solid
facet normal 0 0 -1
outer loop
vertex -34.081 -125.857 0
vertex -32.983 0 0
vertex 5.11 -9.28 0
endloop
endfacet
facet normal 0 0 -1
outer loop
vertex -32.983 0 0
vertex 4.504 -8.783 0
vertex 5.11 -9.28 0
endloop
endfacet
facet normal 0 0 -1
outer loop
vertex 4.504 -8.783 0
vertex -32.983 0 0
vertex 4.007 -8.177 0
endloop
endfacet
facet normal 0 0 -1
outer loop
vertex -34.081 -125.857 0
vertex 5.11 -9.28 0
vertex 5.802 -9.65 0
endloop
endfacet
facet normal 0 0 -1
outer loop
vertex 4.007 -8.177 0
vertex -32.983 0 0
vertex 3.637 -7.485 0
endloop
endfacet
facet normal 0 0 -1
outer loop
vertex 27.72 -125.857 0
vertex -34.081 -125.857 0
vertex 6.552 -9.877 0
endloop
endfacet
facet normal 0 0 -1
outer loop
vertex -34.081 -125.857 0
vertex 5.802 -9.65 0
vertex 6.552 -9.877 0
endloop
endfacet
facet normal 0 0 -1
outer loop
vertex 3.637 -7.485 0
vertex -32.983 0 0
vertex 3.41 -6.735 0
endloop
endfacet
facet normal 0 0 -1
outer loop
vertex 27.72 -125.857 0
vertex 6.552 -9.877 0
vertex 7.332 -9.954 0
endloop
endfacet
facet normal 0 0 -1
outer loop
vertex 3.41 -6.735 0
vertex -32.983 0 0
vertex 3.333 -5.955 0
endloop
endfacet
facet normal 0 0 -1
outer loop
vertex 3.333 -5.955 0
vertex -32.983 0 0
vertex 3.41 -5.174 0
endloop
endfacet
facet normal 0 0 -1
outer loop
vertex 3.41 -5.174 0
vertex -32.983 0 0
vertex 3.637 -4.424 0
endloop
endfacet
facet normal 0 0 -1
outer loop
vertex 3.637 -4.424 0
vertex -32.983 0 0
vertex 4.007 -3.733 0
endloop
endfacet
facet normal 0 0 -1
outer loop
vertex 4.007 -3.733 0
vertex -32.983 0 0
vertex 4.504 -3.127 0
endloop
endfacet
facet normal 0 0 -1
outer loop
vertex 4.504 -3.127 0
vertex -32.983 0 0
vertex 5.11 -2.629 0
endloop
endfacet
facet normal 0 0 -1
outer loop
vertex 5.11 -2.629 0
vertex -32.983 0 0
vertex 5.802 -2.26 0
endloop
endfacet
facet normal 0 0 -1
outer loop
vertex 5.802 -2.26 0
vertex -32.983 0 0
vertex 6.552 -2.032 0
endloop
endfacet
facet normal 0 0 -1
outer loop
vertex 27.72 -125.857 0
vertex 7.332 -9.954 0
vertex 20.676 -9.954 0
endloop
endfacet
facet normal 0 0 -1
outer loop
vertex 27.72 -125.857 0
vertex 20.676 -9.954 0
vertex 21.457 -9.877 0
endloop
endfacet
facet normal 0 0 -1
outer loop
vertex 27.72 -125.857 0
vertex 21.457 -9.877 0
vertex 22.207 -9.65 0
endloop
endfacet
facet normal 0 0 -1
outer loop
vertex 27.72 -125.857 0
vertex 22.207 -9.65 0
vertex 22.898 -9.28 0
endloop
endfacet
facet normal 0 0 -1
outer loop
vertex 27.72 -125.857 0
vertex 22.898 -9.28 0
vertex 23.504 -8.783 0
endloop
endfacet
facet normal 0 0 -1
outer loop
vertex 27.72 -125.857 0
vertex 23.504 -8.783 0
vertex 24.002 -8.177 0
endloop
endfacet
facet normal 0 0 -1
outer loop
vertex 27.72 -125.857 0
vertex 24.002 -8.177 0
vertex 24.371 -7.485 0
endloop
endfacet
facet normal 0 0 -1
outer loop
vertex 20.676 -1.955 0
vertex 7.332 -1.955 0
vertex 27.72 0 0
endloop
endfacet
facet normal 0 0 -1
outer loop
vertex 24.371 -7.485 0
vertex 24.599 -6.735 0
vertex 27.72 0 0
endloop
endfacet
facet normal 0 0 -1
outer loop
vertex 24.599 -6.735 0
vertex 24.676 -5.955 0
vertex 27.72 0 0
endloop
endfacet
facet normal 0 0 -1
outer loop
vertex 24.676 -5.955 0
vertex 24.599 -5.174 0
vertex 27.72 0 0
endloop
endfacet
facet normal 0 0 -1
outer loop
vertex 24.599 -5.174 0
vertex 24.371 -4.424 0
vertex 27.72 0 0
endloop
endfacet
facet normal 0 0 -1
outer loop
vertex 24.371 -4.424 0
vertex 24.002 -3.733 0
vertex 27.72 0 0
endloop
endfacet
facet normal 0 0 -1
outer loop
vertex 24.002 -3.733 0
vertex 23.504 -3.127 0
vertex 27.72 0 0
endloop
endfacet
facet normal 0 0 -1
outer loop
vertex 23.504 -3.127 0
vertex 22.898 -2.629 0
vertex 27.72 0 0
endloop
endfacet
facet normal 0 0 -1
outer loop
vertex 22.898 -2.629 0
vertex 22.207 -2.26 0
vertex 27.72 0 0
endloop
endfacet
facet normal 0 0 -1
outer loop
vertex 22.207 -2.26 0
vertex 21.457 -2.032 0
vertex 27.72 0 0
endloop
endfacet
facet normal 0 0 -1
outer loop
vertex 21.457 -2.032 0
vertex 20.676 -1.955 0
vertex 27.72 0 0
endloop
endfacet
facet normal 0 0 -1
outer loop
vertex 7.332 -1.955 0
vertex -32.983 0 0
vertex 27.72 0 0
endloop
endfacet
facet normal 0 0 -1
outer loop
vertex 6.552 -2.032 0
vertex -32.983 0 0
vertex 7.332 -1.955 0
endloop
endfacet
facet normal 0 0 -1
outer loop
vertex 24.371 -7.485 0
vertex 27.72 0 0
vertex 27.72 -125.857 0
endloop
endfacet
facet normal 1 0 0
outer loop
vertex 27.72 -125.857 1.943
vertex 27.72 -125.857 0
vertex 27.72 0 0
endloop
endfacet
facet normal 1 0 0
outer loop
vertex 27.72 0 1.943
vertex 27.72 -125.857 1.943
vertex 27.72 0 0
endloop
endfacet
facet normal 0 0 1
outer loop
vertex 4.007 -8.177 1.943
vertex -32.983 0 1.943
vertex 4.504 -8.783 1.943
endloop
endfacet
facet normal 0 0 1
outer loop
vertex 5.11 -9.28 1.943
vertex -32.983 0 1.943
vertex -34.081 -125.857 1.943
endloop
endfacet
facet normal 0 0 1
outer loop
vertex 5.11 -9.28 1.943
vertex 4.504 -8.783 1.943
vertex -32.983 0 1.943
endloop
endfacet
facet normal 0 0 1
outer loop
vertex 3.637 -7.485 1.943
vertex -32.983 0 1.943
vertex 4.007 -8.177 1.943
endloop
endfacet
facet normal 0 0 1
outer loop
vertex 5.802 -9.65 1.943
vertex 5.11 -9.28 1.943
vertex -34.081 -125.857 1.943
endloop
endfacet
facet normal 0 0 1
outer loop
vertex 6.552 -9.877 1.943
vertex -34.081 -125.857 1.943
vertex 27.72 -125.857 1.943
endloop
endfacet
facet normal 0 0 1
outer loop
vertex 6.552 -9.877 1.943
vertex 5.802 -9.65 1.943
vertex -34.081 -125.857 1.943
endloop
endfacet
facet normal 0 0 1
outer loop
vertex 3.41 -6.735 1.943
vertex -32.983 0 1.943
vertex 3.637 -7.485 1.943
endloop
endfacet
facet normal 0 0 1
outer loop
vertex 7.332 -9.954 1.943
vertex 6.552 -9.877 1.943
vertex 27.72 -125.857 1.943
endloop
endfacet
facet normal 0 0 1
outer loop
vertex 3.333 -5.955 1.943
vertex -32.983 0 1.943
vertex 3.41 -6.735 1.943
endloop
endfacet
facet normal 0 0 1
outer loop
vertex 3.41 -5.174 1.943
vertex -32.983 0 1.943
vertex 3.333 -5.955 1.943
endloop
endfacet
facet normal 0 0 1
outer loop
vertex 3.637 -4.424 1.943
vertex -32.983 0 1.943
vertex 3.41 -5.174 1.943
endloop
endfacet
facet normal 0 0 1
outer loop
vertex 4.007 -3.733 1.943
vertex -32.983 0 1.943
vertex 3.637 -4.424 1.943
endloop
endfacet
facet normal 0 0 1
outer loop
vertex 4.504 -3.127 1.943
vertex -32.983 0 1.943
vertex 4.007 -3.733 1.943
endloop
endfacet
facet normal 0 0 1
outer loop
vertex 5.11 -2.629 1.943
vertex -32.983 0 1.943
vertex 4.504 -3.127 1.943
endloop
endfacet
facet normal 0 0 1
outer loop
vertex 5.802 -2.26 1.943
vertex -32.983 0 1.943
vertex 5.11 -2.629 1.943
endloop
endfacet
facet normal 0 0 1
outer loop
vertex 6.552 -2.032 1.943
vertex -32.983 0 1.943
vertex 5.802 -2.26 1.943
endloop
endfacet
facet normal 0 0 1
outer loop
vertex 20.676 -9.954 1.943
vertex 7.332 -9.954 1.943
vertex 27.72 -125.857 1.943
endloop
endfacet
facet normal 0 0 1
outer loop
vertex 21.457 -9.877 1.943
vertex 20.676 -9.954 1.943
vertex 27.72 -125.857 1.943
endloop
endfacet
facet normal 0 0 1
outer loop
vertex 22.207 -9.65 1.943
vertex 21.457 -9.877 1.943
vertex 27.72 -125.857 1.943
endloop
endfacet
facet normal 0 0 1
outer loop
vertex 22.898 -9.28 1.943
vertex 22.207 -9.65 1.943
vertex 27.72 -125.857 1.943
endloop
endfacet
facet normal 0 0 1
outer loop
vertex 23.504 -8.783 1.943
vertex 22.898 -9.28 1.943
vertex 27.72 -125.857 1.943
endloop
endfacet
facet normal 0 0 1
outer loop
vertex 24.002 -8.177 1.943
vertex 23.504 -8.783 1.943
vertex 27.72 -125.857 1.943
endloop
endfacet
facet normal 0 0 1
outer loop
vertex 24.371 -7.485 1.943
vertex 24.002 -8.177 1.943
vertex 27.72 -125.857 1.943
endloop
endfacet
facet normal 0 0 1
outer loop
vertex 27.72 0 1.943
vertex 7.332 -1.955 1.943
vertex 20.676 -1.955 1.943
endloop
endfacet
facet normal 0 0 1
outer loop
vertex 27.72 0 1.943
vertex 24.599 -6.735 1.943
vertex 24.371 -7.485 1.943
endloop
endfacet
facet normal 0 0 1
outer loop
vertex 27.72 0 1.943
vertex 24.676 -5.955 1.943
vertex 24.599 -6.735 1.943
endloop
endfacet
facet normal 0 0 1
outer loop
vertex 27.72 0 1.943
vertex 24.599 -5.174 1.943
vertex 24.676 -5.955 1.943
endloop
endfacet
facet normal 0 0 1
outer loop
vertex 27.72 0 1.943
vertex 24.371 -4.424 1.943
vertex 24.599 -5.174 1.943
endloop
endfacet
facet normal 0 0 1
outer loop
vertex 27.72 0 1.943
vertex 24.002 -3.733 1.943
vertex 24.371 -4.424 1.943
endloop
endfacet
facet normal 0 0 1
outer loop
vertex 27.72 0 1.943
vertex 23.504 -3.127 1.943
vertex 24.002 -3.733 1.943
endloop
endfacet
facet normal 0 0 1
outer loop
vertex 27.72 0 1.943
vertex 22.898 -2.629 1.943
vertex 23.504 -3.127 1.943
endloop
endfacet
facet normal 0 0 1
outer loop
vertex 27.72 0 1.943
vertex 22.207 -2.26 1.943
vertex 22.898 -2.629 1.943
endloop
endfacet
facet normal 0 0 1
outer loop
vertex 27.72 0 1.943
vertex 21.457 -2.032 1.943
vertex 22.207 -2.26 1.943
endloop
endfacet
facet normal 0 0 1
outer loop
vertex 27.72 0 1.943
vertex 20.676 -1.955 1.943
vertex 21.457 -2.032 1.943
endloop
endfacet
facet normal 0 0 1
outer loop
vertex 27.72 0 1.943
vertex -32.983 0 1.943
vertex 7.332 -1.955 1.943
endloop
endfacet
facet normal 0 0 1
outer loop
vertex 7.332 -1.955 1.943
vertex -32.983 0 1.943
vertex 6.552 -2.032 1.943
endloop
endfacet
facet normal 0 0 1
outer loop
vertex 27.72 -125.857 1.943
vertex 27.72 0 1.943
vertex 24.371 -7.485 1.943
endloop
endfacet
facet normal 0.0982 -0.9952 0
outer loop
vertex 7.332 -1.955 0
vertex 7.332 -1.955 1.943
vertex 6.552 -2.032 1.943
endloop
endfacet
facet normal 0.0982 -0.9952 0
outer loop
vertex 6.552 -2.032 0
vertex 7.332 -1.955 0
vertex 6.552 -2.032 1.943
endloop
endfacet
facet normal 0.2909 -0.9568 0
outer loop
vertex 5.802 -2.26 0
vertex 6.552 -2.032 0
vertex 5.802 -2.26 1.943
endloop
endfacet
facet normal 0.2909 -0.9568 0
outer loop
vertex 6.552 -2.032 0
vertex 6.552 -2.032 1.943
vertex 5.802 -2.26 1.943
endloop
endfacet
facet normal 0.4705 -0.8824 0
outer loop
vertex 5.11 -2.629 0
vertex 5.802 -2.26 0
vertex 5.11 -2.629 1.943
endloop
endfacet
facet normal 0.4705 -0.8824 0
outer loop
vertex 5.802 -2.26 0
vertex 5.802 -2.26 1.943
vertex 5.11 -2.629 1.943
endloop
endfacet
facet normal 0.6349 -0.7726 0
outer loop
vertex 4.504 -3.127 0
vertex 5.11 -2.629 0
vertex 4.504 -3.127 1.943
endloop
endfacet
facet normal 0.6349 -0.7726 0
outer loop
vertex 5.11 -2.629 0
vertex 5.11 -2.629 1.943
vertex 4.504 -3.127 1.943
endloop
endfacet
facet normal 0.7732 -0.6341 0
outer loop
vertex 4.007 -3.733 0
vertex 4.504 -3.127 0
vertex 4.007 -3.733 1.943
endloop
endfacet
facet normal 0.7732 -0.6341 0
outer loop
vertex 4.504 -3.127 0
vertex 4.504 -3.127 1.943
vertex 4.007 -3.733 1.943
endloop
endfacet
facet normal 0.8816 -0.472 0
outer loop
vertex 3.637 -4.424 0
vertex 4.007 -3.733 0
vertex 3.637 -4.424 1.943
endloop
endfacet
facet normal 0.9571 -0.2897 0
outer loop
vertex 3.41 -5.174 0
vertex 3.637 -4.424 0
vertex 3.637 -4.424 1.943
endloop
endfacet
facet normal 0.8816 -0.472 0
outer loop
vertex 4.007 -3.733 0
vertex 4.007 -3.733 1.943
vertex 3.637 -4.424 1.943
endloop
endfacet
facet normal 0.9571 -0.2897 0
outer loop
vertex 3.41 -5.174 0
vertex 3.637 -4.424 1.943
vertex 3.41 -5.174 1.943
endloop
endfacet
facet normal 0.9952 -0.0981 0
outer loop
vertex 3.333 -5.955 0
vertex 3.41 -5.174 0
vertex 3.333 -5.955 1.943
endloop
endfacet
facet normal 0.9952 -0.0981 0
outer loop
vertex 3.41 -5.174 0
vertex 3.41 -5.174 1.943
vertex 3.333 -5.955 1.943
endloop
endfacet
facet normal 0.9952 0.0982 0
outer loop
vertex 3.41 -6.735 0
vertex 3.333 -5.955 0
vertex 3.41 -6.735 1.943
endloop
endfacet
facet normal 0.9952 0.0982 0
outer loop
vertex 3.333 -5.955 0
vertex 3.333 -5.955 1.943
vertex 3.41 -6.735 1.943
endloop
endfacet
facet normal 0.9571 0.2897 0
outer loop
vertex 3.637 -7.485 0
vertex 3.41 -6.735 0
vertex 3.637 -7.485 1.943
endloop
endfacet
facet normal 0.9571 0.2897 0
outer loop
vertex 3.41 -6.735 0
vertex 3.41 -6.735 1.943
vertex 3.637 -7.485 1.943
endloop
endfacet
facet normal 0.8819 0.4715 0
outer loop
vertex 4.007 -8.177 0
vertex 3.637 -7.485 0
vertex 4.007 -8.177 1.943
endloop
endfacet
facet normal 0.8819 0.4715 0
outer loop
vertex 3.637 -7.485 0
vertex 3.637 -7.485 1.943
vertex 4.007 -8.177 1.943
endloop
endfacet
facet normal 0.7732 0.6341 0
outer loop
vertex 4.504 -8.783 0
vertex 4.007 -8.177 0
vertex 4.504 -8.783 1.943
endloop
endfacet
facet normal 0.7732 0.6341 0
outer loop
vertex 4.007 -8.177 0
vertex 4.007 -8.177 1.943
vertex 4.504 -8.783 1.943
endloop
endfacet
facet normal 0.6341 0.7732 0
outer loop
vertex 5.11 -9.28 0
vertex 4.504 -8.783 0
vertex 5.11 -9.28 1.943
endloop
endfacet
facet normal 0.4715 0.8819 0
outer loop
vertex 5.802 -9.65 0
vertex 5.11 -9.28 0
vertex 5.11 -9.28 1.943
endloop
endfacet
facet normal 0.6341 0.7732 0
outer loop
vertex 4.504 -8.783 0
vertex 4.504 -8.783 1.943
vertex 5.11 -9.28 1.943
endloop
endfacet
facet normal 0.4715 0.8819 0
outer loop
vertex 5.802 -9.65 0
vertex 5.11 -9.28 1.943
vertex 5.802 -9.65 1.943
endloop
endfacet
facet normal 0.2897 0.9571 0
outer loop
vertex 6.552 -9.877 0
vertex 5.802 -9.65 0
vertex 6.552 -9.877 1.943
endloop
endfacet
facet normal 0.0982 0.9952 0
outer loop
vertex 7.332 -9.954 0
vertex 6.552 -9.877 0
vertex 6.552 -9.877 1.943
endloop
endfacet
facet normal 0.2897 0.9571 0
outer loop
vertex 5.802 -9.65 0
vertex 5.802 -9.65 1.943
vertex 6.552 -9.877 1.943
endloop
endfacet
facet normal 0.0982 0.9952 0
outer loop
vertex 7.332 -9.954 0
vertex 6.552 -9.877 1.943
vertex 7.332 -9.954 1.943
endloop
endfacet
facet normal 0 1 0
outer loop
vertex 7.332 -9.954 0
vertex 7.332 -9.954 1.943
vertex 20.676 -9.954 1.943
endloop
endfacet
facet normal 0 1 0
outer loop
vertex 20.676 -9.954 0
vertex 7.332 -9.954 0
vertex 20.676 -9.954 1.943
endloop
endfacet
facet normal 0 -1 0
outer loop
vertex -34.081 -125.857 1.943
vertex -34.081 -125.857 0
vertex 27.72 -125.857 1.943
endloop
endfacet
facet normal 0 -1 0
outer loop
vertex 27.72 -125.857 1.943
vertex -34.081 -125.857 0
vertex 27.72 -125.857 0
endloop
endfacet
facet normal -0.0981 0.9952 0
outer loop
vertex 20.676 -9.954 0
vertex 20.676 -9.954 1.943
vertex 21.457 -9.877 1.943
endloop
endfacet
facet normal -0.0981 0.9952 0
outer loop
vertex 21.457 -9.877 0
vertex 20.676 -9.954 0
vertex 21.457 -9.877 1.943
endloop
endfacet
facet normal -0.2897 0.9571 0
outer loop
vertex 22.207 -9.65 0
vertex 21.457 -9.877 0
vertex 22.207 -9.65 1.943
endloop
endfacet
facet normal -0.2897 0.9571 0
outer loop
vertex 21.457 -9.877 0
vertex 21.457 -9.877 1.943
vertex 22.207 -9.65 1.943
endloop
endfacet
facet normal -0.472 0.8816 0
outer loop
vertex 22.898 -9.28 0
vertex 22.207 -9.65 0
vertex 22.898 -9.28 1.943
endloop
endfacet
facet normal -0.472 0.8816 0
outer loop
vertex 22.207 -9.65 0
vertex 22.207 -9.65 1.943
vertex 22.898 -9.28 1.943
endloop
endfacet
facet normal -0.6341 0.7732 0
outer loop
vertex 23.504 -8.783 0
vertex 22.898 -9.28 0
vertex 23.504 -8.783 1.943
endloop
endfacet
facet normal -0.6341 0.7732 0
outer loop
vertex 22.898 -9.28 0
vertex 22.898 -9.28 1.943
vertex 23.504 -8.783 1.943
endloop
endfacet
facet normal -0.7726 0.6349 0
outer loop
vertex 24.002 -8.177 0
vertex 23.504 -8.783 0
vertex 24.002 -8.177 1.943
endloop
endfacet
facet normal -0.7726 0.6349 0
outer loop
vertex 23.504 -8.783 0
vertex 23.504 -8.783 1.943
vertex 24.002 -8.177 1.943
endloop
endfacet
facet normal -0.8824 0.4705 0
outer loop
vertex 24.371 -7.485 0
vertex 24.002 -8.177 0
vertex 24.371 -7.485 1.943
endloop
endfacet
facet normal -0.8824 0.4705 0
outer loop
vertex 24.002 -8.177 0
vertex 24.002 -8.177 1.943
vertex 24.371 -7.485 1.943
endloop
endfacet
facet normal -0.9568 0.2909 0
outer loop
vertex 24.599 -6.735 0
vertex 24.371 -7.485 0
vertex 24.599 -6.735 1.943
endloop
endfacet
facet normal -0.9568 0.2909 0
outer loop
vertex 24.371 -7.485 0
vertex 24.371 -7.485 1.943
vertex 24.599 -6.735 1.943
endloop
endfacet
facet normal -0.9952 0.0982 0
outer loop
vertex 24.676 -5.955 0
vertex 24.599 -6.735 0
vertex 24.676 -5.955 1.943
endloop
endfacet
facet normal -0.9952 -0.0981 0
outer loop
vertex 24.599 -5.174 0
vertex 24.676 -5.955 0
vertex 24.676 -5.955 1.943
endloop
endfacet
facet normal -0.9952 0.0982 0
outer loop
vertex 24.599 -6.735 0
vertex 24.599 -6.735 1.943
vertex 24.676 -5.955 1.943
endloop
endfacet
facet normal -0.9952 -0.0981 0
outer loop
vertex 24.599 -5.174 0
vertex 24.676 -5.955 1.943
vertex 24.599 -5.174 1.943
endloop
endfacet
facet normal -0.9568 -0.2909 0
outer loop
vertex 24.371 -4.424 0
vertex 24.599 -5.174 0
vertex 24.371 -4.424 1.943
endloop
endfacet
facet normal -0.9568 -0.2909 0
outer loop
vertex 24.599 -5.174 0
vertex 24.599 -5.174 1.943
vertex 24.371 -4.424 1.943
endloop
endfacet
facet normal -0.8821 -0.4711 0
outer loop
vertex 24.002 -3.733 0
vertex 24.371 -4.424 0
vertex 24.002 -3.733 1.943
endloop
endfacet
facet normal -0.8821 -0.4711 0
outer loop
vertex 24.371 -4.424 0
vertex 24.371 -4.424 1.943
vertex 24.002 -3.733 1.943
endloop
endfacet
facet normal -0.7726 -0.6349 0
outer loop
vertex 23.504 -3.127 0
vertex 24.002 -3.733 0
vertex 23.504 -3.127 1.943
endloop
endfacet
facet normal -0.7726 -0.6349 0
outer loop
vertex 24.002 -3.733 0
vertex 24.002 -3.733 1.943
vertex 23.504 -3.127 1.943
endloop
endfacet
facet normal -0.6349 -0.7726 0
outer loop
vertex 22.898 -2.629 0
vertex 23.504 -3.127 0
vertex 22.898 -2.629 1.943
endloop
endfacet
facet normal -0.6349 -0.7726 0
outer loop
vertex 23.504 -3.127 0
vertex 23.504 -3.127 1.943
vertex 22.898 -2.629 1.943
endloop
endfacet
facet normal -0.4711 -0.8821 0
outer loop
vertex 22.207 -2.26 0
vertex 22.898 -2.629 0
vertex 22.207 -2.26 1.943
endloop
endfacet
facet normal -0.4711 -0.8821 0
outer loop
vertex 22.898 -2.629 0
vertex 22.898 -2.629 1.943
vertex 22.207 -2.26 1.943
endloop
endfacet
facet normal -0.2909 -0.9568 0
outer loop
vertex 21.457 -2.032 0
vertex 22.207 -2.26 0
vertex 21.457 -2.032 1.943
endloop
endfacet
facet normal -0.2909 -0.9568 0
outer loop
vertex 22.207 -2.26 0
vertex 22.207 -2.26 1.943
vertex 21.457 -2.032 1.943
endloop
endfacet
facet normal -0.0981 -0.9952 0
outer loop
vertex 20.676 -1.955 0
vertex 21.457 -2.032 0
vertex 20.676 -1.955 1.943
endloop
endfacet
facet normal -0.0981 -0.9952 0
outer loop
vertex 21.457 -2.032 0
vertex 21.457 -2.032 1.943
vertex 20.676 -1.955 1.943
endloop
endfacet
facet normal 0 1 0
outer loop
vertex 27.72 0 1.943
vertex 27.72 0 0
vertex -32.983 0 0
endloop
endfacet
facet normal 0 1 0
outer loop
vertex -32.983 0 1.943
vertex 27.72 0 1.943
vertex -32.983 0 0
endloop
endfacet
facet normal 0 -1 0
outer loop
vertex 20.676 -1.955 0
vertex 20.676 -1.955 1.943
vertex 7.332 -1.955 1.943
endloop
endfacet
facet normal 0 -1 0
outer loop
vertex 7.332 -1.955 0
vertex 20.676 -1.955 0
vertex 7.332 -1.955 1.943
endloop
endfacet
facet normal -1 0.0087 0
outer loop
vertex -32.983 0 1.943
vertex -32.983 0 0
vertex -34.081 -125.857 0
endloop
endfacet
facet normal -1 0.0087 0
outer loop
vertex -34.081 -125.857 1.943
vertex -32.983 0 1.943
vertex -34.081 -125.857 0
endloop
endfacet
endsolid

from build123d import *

# Parameters (mm, degrees)
F1_DEPTH = 1.9431
F3_DEPTH = 25.4


with BuildPart() as f1:
    # F0 (on Top) → F1 (new body)
    with BuildSketch(Plane.XY):
        Polygon((27.7205, 0), (-32.982886, 0), (-34.080576, -125.857264), (27.7205, -125.857264), align=None)
    extrude(amount=F1_DEPTH)

    # F2 (on face) → F3 (cut)
    with BuildSketch(Plane.XY.offset(1.9431)):
        with BuildLine():
            Line((7.332415, -4.307757), (7.332415, -1.955202))
            ThreePointArc((7.332415, -1.955202), (3.332973, -5.954644), (7.332415, -9.954086))
            Line((7.332415, -9.954086), (7.332415, -4.307757))
        make_face()
        Polygon((14.004417, -4.307757), (14.004417, -1.955202), (7.332415, -1.955202), (7.332415, -4.307757), (7.332415, -9.954086), (14.004417, -9.954086), align=None)
        with BuildLine():
            Line((20.676419, -1.955202), (20.676419, -4.307757))
            Line((20.676419, -4.307757), (20.676419, -9.954086))
            ThreePointArc((20.676419, -9.954086), (24.675861, -5.954644), (20.676419, -1.955202))
        make_face()
        Polygon((20.676419, -9.954086), (20.676419, -4.307757), (20.676419, -1.955202), (14.004417, -1.955202), (14.004417, -4.307757), (14.004417, -9.954086), (14.634087, -9.954086), align=None)
    extrude(amount=-F3_DEPTH, mode=Mode.SUBTRACT)


solid = f1.part
